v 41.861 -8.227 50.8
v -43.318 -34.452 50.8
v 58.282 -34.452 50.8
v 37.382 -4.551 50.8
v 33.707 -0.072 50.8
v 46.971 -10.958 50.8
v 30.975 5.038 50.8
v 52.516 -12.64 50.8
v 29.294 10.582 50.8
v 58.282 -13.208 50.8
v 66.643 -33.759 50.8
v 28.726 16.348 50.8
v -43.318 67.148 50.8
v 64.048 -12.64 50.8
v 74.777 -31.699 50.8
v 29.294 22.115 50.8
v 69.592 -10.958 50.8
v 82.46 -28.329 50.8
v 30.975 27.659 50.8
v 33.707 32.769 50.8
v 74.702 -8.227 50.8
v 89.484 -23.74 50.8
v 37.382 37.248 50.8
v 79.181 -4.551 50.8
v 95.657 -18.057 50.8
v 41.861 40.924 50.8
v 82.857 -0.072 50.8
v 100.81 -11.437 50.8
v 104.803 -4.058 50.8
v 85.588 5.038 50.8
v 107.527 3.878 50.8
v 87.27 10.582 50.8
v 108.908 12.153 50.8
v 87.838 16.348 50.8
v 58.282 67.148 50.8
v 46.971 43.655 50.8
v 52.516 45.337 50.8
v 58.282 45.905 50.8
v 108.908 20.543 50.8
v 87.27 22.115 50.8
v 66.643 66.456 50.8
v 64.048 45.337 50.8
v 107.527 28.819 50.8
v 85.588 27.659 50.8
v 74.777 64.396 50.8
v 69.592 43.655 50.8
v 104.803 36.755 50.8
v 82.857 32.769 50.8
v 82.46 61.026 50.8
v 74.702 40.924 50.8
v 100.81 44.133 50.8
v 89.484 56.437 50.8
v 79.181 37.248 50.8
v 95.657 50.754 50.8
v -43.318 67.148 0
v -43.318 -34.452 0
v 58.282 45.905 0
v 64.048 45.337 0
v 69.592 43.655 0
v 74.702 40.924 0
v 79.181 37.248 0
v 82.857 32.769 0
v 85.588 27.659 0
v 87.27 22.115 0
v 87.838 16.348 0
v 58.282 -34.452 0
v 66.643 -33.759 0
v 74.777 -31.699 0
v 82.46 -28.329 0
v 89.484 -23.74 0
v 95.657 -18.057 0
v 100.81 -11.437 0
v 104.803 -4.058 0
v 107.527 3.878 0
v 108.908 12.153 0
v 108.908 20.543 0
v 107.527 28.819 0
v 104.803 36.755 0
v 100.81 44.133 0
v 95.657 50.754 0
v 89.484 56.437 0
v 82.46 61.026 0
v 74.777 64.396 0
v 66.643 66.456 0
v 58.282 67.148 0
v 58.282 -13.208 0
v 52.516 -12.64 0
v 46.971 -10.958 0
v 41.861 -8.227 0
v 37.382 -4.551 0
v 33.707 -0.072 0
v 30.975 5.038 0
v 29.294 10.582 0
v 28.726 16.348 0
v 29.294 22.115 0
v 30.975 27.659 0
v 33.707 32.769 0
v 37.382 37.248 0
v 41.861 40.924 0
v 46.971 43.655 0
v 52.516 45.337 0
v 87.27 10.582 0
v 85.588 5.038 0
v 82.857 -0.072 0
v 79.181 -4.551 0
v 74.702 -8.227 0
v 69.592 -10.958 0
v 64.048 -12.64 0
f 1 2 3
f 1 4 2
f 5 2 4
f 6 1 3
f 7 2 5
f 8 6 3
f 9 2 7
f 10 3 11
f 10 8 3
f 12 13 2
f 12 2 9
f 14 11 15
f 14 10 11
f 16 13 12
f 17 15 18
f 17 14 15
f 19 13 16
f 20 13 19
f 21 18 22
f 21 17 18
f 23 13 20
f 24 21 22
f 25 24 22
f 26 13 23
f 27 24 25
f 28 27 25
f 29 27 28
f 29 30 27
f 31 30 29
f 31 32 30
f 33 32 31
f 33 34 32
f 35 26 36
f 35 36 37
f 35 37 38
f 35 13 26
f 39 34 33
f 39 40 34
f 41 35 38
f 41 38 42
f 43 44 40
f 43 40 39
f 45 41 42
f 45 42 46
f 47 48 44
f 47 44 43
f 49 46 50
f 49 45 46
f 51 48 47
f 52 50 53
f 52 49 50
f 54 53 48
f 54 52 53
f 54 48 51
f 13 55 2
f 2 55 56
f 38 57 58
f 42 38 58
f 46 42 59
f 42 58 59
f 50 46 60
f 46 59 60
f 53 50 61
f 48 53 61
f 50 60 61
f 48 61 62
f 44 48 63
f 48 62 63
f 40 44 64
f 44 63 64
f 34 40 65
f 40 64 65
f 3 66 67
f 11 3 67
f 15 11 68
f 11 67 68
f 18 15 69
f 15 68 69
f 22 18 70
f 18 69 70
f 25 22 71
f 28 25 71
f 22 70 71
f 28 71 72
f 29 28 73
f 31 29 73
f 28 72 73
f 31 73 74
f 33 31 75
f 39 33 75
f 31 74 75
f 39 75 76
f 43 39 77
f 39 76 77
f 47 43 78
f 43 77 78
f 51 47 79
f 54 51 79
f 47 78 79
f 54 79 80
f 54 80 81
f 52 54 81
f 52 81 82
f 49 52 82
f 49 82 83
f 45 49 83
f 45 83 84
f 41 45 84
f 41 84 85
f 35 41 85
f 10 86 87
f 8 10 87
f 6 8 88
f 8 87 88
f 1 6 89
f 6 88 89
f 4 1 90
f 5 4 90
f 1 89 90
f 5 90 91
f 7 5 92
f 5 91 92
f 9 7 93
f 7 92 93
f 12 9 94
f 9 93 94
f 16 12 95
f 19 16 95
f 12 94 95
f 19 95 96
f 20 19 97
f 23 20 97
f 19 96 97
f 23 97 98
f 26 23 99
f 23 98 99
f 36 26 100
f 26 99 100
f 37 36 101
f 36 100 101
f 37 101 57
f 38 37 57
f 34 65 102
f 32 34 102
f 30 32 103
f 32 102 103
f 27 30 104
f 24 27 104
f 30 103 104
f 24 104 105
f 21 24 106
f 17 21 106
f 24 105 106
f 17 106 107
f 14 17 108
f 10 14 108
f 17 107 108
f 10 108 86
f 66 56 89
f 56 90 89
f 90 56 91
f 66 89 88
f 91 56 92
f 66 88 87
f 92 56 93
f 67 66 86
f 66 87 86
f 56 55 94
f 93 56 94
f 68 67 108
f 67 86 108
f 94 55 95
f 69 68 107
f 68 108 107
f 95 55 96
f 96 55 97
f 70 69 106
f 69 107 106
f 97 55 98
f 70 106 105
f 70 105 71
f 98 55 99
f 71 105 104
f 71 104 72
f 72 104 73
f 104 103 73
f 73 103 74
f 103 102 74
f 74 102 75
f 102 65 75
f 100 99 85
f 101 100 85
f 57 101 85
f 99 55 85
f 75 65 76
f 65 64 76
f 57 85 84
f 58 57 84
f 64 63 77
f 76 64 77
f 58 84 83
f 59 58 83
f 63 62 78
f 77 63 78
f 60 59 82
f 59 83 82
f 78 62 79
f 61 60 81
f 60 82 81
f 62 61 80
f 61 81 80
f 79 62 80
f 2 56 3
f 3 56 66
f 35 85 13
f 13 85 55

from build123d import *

# Parameters (mm, degrees)
F1_DEPTH = 50.8


with BuildPart() as f1:
    # F0 (on Top) → F1 (new body)
    with BuildSketch(Plane.XY):
        with BuildLine():
            Line((58.2818202674, 67.1484221876), (-43.3181797326, 67.1484221876))
            Line((-43.3181797326, 67.1484221876), (-43.3181797326, -34.4515778124))
            Line((-43.3181797326, -34.4515778124), (58.2818202674, -34.4515778124))
            Line((58.2818202674, -34.4515778124), (58.2818202674, -13.207797377))
            ThreePointArc((58.2818202674, -13.207797377), (28.7256007029, 16.3484221876), (58.2818202674, 45.9046417521))
            Line((58.2818202674, 45.9046417521), (58.2818202674, 67.1484221876))
        make_face()
        with BuildLine():
            ThreePointArc((58.2818202674, -34.4515778124), (109.0818202674, 16.3484221876), (58.2818202674, 67.1484221876))
            Line((58.2818202674, 67.1484221876), (58.2818202674, 45.9046417521))
            ThreePointArc((58.2818202674, 45.9046417521), (79.1812235478, 37.2478254679), (87.838039832, 16.3484221876))
            ThreePointArc((87.838039832, 16.3484221876), (79.1812235478, -4.5509810928), (58.2818202674, -13.207797377))
            Line((58.2818202674, -13.207797377), (58.2818202674, -34.4515778124))
        make_face()
    extrude(amount=F1_DEPTH)


solid = f1.part
